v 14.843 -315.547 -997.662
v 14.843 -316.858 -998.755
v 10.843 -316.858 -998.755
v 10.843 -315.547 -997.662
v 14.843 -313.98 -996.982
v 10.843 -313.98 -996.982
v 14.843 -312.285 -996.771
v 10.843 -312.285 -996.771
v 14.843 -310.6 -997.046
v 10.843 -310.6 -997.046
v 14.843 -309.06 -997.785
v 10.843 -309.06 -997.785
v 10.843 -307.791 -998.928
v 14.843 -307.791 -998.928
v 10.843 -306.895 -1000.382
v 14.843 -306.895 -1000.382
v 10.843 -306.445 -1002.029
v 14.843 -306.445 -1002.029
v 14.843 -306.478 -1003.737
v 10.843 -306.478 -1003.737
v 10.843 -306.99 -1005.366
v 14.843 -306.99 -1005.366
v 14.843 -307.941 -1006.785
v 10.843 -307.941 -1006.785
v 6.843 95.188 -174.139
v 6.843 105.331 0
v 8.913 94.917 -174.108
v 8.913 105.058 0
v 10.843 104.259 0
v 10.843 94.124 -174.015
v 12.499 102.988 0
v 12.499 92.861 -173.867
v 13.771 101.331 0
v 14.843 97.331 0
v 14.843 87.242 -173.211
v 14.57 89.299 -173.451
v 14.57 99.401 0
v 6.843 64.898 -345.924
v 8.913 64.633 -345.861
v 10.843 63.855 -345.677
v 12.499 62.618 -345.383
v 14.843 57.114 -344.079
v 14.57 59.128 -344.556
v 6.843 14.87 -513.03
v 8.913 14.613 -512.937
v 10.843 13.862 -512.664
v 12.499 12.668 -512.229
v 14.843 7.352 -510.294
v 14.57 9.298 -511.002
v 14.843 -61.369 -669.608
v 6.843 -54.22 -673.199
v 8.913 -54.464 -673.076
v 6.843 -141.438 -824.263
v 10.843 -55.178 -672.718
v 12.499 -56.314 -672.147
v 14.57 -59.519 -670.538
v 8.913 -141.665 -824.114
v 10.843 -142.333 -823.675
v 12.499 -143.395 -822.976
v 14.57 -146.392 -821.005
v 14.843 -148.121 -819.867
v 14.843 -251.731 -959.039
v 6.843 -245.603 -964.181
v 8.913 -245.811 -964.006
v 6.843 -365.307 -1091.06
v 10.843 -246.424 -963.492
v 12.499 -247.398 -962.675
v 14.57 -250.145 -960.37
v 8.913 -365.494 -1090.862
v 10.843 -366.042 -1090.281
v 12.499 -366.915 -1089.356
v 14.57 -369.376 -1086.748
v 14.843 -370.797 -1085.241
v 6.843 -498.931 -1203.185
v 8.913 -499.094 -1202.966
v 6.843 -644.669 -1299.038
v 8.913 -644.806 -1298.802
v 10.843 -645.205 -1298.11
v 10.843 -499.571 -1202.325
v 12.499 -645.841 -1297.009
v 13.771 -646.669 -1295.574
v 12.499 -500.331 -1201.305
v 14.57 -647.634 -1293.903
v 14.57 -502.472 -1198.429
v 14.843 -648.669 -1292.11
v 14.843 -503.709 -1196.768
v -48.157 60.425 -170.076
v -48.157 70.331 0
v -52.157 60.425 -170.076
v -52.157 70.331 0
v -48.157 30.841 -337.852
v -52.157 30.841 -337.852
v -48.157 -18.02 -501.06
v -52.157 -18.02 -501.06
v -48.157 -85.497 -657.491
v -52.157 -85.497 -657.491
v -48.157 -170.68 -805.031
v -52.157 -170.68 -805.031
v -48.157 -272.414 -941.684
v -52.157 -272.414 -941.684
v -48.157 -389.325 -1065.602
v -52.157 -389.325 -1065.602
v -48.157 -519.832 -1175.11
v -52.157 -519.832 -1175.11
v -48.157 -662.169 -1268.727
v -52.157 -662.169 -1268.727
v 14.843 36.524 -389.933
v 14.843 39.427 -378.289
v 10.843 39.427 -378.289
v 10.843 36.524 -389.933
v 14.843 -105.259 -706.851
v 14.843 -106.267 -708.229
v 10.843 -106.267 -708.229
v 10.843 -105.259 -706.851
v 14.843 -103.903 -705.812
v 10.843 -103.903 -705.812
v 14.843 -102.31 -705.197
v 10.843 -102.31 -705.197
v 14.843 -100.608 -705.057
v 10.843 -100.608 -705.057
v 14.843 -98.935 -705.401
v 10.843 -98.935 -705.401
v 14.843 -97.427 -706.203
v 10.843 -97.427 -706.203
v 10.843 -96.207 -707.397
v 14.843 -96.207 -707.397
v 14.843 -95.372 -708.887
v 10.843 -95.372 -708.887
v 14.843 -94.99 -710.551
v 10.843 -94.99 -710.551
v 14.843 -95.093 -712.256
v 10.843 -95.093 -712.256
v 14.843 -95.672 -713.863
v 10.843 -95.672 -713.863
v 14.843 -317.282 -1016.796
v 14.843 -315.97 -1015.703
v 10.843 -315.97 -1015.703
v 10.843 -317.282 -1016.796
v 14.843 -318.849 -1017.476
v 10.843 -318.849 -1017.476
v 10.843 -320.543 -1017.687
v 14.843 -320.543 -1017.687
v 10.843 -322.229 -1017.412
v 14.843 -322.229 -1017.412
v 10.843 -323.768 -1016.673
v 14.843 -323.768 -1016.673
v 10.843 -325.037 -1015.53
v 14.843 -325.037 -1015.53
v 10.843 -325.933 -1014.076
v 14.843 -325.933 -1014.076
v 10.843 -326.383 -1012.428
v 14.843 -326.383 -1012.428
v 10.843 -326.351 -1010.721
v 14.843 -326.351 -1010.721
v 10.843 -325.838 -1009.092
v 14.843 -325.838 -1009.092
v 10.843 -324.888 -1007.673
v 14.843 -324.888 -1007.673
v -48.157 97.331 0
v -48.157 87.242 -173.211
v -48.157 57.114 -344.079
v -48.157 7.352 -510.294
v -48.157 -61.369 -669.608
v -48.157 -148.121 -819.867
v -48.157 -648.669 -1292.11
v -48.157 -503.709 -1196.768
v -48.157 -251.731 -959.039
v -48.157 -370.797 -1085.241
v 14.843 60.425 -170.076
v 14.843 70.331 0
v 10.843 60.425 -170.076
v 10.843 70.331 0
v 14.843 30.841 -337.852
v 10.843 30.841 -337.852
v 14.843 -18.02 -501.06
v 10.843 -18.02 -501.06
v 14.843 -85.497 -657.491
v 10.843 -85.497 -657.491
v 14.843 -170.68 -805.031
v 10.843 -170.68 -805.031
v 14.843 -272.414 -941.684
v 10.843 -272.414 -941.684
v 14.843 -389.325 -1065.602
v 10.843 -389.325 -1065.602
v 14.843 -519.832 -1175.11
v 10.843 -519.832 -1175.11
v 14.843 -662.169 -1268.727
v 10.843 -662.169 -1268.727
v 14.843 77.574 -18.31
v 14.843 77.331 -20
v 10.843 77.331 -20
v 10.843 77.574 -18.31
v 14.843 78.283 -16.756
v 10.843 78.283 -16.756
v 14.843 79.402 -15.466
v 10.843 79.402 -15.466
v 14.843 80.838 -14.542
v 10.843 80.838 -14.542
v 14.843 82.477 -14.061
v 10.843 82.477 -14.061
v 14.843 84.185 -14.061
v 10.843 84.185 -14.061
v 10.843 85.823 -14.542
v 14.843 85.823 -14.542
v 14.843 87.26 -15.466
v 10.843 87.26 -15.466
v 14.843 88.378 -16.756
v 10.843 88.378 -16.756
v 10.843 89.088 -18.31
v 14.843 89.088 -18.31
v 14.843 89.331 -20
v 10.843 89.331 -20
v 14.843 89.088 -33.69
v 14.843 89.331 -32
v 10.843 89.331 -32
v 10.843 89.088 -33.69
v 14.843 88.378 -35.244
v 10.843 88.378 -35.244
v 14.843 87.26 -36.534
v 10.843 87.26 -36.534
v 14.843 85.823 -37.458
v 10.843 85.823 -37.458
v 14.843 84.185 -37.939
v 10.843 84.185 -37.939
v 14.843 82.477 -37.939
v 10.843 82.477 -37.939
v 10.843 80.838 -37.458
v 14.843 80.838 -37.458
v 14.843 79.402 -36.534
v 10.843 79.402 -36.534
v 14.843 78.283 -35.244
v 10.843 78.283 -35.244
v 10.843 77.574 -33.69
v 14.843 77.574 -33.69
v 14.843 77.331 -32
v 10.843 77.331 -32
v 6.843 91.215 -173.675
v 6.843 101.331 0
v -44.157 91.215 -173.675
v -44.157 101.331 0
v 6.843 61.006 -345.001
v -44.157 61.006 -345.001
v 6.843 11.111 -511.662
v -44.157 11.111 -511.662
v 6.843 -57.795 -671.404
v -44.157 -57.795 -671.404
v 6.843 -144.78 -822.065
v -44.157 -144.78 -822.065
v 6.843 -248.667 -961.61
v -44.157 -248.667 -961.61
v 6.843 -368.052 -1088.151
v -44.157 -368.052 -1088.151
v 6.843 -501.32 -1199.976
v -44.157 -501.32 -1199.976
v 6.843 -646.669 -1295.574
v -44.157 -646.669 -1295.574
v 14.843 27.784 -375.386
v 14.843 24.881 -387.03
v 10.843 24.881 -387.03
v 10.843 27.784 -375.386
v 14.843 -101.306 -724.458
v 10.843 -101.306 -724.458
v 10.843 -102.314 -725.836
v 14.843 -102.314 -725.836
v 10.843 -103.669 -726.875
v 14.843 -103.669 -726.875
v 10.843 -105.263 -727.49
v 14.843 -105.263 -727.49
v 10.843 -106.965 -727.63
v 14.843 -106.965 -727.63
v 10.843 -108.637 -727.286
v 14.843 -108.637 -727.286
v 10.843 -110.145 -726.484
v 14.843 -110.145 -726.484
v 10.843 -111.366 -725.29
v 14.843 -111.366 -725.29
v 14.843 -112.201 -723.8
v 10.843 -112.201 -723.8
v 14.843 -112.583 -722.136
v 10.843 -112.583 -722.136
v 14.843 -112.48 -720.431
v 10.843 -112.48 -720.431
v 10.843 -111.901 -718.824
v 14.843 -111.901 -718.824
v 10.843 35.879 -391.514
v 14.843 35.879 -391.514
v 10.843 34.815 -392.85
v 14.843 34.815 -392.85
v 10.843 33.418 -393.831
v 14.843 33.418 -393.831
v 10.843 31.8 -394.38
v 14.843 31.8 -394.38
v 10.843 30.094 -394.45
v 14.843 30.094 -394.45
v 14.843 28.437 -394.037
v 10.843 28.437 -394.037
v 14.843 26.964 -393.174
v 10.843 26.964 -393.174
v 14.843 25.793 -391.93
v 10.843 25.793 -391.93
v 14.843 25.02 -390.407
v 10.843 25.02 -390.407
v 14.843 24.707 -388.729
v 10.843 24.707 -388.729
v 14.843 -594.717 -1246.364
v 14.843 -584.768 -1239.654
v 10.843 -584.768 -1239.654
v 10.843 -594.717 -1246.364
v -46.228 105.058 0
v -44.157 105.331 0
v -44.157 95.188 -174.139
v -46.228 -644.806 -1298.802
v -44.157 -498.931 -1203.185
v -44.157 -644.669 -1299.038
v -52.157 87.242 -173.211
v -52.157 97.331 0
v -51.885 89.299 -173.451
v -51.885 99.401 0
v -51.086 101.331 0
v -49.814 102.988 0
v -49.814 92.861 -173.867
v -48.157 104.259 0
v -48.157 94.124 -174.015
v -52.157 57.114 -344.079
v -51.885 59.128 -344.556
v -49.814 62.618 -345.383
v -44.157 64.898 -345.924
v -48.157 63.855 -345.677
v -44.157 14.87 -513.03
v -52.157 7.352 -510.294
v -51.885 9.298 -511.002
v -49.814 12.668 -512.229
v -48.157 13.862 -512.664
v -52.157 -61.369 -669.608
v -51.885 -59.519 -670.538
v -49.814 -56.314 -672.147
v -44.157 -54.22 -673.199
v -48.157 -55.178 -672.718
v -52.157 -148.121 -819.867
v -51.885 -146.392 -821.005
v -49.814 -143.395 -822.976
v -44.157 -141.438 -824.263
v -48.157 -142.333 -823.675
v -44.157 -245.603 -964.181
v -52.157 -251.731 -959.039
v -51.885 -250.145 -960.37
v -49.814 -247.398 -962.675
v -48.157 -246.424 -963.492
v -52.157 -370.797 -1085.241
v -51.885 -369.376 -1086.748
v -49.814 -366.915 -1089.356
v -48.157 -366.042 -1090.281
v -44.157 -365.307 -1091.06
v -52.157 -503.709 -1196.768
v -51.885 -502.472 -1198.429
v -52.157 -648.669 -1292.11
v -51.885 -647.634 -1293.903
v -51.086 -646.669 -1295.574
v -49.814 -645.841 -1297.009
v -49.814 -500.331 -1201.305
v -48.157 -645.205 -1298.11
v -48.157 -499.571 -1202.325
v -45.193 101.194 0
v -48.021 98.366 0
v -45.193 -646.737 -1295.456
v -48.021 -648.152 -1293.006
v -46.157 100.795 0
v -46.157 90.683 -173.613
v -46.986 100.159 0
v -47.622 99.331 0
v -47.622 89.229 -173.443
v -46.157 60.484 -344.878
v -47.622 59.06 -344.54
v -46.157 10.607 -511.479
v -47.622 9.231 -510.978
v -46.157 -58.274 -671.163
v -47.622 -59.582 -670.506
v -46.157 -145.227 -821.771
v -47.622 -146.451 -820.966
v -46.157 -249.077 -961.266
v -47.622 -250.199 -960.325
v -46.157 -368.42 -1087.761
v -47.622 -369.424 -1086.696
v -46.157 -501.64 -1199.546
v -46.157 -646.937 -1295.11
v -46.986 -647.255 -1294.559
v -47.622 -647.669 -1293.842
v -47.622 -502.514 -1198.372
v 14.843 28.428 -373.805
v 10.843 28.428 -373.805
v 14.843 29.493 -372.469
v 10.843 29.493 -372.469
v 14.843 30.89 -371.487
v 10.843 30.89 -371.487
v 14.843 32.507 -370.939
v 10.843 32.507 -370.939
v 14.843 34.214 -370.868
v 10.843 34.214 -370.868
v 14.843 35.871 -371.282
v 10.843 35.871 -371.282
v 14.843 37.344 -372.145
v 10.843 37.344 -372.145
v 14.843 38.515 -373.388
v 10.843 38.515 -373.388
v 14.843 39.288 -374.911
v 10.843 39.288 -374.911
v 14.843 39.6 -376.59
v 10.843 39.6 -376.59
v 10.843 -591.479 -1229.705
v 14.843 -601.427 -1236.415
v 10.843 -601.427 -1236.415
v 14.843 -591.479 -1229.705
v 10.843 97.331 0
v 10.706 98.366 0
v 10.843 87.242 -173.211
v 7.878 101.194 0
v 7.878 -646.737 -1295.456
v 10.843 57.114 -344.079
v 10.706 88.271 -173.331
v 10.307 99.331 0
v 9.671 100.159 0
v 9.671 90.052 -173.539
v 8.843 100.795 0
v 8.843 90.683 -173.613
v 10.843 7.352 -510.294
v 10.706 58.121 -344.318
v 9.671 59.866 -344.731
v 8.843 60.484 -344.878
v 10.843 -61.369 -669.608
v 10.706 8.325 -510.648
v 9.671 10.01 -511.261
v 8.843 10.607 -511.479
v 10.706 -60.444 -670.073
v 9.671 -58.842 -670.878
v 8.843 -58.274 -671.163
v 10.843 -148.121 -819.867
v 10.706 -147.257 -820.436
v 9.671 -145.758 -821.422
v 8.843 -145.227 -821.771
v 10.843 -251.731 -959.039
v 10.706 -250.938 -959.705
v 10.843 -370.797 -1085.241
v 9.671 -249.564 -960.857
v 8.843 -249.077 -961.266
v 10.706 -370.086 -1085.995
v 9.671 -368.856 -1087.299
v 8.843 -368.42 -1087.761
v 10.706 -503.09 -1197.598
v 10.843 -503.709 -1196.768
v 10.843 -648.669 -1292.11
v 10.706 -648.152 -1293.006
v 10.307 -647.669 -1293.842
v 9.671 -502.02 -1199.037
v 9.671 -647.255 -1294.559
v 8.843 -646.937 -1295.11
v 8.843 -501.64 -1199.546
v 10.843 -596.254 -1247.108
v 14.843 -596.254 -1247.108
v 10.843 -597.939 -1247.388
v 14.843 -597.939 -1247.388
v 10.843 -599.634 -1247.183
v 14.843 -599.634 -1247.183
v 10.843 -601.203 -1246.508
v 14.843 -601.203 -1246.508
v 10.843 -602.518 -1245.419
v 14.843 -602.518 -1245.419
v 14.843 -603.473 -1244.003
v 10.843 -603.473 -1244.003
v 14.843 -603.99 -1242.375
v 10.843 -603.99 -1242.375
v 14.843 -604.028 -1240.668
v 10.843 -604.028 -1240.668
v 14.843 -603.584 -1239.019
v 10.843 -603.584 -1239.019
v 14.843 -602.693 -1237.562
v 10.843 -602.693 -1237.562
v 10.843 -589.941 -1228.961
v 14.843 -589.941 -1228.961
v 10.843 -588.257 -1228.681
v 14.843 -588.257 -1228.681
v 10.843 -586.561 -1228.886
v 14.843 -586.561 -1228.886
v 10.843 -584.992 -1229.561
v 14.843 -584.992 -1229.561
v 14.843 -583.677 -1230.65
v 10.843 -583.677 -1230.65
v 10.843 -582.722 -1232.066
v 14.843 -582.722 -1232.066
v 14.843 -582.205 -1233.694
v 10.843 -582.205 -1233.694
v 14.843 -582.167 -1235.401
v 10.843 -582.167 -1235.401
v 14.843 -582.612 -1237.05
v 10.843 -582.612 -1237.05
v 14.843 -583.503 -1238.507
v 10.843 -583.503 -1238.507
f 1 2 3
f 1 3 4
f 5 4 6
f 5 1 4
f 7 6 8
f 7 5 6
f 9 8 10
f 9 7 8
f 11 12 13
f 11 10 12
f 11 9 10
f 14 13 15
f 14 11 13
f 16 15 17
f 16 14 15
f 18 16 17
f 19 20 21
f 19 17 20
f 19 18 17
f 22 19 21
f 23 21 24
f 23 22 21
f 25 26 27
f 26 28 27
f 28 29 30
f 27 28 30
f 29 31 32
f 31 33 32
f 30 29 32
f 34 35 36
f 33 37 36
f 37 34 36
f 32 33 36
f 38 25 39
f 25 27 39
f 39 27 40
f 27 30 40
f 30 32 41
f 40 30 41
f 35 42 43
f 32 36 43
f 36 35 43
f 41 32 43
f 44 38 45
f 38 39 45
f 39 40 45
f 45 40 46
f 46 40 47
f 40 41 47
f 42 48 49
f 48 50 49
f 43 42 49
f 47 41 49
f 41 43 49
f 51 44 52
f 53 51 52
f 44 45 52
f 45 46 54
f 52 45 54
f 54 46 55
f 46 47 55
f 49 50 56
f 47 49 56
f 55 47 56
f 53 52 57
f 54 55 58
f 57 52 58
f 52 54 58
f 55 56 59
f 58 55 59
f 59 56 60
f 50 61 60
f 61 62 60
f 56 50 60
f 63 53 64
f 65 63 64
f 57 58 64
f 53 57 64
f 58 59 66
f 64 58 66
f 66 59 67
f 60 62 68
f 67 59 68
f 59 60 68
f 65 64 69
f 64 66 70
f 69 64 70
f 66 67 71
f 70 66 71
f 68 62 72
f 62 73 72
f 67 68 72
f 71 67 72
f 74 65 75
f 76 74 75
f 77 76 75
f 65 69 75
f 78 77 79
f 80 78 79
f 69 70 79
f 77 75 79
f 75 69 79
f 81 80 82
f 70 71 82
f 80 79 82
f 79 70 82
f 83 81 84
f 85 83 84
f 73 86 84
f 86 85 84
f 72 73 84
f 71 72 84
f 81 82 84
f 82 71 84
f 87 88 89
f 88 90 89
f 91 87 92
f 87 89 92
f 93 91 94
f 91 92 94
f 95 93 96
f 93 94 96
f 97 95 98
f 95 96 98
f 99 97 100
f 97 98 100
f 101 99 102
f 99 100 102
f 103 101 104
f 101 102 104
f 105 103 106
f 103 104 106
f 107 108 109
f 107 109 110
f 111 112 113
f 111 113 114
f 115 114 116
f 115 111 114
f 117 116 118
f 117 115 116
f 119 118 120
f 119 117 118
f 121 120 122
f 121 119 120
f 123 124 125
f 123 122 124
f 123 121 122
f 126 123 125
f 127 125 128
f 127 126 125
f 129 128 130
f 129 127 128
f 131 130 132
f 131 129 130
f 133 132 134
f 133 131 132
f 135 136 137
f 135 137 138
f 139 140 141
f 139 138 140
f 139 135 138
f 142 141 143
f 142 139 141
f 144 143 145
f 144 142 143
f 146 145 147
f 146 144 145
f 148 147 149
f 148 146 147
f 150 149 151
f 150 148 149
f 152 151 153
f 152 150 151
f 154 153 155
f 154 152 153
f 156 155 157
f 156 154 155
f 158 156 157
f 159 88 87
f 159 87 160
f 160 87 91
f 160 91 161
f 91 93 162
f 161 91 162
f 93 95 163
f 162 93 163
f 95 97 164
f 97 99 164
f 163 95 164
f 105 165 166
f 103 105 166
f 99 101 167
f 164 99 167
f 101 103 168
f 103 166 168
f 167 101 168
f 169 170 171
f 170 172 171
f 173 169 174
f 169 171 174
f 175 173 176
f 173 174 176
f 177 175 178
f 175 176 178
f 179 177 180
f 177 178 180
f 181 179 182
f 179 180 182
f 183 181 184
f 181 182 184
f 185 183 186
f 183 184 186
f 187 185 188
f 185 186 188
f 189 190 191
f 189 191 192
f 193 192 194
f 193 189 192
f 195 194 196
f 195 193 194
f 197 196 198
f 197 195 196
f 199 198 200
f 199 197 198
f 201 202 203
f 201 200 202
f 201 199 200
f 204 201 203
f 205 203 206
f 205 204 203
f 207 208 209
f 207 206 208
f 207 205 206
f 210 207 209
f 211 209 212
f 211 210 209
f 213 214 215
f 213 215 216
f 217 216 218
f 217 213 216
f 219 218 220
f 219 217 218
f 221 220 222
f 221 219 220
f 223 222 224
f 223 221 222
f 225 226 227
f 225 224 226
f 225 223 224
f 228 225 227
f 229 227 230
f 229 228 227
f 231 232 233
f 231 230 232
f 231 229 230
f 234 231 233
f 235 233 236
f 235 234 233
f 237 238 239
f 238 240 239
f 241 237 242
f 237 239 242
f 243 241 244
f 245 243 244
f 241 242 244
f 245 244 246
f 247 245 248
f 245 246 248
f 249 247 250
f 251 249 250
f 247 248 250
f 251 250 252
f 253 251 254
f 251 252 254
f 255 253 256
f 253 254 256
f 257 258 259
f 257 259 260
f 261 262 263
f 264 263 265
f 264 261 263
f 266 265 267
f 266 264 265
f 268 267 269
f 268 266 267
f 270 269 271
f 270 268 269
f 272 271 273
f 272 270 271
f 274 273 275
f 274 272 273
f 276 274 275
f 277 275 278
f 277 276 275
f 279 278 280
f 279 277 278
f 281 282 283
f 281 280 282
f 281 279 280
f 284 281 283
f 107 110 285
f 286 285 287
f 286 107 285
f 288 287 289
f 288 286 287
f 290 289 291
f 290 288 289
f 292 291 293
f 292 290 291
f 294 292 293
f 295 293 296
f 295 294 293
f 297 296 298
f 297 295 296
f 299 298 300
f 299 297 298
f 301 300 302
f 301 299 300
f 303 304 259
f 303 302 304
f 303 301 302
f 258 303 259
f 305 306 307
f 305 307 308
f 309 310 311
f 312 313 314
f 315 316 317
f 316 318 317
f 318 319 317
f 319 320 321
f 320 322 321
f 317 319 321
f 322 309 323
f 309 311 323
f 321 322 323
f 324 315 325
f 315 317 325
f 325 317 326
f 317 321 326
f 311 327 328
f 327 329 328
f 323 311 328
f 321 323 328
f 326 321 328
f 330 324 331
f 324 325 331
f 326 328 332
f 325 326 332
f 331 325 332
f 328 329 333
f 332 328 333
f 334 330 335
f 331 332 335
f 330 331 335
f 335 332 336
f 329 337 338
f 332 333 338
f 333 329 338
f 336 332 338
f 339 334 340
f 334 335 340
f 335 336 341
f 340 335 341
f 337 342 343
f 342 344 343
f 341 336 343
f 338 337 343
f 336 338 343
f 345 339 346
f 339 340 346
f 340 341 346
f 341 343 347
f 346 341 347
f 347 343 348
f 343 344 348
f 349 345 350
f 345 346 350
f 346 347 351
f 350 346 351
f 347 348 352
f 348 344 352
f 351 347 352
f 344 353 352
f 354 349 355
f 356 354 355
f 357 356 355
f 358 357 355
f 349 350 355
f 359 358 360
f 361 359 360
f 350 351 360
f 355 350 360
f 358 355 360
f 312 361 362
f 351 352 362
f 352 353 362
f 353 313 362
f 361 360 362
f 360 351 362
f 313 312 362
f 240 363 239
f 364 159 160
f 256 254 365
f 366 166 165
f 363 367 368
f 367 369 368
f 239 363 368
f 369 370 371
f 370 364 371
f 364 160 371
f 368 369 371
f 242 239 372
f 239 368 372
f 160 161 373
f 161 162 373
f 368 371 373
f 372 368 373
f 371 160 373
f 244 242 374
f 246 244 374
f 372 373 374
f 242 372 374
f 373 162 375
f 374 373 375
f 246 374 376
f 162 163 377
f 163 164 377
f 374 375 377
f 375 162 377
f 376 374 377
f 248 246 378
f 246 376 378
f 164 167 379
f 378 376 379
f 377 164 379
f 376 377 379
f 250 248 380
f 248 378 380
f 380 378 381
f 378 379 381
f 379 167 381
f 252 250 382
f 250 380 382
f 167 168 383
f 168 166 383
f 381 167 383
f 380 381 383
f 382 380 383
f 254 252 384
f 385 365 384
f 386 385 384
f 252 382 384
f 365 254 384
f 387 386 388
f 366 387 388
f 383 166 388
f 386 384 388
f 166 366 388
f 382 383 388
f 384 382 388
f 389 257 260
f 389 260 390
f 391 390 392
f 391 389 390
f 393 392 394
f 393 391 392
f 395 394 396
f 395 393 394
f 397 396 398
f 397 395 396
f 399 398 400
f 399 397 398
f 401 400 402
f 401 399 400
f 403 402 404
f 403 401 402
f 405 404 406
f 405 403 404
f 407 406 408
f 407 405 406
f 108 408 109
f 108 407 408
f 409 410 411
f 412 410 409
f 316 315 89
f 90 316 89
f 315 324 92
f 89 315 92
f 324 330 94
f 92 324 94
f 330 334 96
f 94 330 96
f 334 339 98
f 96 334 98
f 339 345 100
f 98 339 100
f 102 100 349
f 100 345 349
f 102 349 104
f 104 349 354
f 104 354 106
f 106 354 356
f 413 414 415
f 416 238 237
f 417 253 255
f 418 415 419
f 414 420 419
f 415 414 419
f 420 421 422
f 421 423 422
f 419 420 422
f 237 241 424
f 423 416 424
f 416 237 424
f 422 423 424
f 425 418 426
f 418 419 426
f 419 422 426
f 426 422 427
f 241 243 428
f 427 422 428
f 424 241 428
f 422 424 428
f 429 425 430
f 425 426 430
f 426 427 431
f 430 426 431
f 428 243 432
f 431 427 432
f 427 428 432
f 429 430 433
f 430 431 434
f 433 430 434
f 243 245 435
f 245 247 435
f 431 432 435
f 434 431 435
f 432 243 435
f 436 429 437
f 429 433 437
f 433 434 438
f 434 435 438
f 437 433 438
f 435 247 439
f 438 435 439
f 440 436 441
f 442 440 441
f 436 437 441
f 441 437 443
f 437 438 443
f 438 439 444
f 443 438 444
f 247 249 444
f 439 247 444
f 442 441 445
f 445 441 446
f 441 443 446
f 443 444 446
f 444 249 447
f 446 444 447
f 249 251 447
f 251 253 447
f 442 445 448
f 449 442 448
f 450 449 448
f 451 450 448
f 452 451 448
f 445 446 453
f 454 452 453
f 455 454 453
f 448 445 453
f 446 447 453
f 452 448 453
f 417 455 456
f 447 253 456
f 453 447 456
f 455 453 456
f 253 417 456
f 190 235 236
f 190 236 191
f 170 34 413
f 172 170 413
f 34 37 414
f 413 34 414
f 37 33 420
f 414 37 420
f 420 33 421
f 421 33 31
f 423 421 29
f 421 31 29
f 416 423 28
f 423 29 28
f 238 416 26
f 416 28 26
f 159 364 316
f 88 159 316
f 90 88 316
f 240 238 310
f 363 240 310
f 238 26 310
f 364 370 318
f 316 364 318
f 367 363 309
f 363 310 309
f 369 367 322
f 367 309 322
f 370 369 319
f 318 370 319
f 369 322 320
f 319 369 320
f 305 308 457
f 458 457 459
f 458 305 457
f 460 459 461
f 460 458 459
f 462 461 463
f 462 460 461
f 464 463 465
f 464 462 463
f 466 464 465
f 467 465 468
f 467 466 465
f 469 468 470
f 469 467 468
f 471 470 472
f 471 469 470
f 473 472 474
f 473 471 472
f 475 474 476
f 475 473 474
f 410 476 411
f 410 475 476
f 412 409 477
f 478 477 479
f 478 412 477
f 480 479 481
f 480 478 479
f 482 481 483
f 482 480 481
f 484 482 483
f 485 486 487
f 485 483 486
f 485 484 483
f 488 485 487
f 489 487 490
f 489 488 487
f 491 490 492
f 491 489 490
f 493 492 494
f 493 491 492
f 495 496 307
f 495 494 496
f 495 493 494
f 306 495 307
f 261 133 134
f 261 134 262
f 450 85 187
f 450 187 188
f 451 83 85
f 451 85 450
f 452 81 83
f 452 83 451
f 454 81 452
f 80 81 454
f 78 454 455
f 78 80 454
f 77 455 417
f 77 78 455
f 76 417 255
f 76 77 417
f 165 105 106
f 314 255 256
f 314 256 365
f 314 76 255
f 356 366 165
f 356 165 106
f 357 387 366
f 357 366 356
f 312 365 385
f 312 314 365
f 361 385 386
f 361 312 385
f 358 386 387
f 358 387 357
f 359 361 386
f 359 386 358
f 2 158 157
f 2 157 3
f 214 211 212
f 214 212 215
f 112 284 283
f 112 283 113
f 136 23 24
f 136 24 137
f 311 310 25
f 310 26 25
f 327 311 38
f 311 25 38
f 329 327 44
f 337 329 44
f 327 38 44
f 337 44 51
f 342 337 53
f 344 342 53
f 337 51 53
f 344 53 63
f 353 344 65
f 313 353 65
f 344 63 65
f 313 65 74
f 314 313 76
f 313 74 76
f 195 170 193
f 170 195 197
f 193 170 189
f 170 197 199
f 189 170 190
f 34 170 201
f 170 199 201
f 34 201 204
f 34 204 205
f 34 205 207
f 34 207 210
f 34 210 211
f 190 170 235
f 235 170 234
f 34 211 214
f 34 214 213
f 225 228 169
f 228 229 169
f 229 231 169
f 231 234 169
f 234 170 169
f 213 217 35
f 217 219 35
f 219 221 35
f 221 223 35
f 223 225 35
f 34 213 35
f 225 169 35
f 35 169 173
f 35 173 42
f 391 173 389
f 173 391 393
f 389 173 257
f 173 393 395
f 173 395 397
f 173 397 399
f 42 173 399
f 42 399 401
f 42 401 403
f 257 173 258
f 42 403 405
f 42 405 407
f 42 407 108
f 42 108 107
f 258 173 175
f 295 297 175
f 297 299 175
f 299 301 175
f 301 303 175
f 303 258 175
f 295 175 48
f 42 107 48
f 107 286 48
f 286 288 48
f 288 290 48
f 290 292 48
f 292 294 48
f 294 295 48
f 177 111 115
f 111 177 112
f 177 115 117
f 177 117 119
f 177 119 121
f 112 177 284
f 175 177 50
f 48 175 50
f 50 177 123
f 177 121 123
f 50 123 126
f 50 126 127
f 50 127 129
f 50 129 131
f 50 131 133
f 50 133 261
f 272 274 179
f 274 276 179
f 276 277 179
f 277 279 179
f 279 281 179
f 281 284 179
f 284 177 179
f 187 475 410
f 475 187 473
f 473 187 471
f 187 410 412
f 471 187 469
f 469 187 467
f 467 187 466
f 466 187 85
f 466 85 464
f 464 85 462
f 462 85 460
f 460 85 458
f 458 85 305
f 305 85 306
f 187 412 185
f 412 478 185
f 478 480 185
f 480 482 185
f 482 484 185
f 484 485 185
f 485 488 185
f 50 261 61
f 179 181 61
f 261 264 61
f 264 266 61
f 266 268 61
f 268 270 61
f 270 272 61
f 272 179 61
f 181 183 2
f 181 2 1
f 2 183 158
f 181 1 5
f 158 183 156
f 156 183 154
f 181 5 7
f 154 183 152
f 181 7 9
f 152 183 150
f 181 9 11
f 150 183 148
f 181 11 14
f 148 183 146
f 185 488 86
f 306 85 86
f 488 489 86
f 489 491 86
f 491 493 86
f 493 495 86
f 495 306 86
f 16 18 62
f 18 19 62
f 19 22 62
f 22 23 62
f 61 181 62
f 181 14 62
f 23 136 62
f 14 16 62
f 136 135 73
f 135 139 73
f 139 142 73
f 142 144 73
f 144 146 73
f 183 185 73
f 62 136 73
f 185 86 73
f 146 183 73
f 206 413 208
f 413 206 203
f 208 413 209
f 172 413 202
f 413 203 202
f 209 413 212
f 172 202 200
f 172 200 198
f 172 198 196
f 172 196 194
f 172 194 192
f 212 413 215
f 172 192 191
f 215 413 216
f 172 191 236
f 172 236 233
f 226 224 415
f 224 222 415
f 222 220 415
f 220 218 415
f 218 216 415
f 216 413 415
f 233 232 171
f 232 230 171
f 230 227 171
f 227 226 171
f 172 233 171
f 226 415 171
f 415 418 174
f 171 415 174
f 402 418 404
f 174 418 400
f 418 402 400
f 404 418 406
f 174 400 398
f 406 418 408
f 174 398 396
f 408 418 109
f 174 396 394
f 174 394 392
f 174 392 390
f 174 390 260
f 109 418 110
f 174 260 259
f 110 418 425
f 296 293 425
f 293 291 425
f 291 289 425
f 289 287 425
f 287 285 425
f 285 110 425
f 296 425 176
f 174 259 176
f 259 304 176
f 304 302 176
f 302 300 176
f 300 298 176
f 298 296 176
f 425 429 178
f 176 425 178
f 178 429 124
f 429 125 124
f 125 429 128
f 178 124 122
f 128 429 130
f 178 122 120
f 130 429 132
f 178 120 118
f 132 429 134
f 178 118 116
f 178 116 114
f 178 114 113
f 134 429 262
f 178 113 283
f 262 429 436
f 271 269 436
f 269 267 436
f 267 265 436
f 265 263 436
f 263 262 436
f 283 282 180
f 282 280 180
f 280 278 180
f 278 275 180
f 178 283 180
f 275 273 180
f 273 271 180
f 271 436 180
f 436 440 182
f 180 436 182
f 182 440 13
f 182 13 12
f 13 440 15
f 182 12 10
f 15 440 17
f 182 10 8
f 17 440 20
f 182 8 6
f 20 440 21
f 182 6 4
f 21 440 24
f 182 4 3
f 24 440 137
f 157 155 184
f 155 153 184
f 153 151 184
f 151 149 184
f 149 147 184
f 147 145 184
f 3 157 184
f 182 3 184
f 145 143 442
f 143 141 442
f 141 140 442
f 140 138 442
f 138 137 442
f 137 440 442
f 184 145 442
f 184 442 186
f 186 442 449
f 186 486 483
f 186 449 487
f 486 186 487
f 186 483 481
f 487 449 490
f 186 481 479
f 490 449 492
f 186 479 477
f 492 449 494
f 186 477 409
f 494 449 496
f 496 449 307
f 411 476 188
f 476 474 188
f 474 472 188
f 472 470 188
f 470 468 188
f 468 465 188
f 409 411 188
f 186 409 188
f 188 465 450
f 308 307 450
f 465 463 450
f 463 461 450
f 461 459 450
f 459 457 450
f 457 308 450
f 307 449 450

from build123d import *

# Parameters (mm, degrees)
REVOLVE1_ANGLE     = 60
CUT_EXTRUDE1_DEPTH = 10


with BuildPart() as part:
    # Sketch1 → Revolve1 (revolve)
    with BuildSketch(Plane.XY):
        with BuildLine():
            ThreePointArc((-52.157480315, 97.330708661), (-49.814334564, 102.987562911), (-44.157480315, 105.330708661))
            Line((-44.157480315, 105.330708661), (6.842519685, 105.330708661))
            ThreePointArc((6.842519685, 105.330708661), (12.499373935, 102.987562911), (14.842519685, 97.330708661))
            Line((14.842519685, 97.330708661), (14.842519685, 70.330708661))
            Line((14.842519685, 70.330708661), (10.842519685, 70.330708661))
            Line((10.842519685, 70.330708661), (10.842519685, 97.330708661))
            ThreePointArc((10.842519685, 97.330708661), (9.67094681, 100.159135786), (6.842519685, 101.330708661))
            Line((6.842519685, 101.330708661), (-44.157480315, 101.330708661))
            ThreePointArc((-44.157480315, 101.330708661), (-46.98590744, 100.159135786), (-48.157480315, 97.330708661))
            Line((-48.157480315, 97.330708661), (-48.157480315, 70.330708661))
            Line((-48.157480315, 70.330708661), (-52.157480315, 70.330708661))
            Line((-52.157480315, 70.330708661), (-52.157480315, 97.330708661))
        make_face()
    revolve(axis=Axis((14.842519685, -1394.669291339, 0), (-1, 0, 0)), revolution_arc=REVOLVE1_ANGLE)

    # Sketch2 → Cut-Extrude1 (cut)
    with BuildSketch(Plane(origin=(14.842519685, 0, 0), x_dir=(0, 0, -1), z_dir=(1, 0, 0))):
        with BuildLine():
            Line((20, 89.330708661), (32, 89.330708661))
            ThreePointArc((32, 89.330708661), (38, 83.330708661), (32, 77.330708661))
            Line((32, 77.330708661), (20, 77.330708661))
            ThreePointArc((20, 77.330708661), (14, 83.330708661), (20, 89.330708661))
        make_face()
        with BuildLine():
            Line((378.289058205, 39.427219846), (389.93260692, 36.524157099))
            ThreePointArc((389.93260692, 36.524157099), (394.302849904, 29.250851367), (387.029544173, 24.880608383))
            Line((387.029544173, 24.880608383), (375.385995457, 27.783671131))
            ThreePointArc((375.385995457, 27.783671131), (371.015752473, 35.056976862), (378.289058205, 39.427219846))
        make_face()
        with BuildLine():
            Line((713.862653541, -95.671890212), (724.458024655, -101.305548965))
            ThreePointArc((724.458024655, -101.305548965), (726.938880836, -109.420063899), (718.824365902, -111.900920079))
            Line((718.824365902, -111.900920079), (708.228994787, -106.267261326))
            ThreePointArc((708.228994787, -106.267261326), (705.748138607, -98.152746392), (713.862653541, -95.671890212))
        make_face()
        with BuildLine():
            Line((1006.784846148, -307.940579621), (1015.702584053, -315.970146897))
            ThreePointArc((1015.702584053, -315.970146897), (1016.146669368, -324.443799488), (1007.673016777, -324.887884803))
            Line((1007.673016777, -324.887884803), (998.755278871, -316.858317527))
            ThreePointArc((998.755278871, -316.858317527), (998.311193557, -308.384664936), (1006.784846148, -307.940579621))
        make_face()
        with BuildLine():
            Line((1239.653554047, -584.768273876), (1246.363868889, -594.716724747))
            ThreePointArc((1246.363868889, -594.716724747), (1244.744800874, -603.046107603), (1236.415418018, -601.427039588))
            Line((1236.415418018, -601.427039588), (1229.705103176, -591.478588718))
            ThreePointArc((1229.705103176, -591.478588718), (1231.324171191, -583.149205861), (1239.653554047, -584.768273876))
        make_face()
        with BuildLine():
            Line((1398.634385557, -909.709041767), (1402.738627277, -920.985353216))
            ThreePointArc((1402.738627277, -920.985353216), (1399.152592412, -928.675629801), (1391.462315827, -925.089594936))
            Line((1391.462315827, -925.089594936), (1387.358074107, -913.813283487))
            ThreePointArc((1387.358074107, -913.813283487), (1390.944108972, -906.123006902), (1398.634385557, -909.709041767))
        make_face()
    extrude(amount=-CUT_EXTRUDE1_DEPTH, mode=Mode.SUBTRACT)


solid = part.part
